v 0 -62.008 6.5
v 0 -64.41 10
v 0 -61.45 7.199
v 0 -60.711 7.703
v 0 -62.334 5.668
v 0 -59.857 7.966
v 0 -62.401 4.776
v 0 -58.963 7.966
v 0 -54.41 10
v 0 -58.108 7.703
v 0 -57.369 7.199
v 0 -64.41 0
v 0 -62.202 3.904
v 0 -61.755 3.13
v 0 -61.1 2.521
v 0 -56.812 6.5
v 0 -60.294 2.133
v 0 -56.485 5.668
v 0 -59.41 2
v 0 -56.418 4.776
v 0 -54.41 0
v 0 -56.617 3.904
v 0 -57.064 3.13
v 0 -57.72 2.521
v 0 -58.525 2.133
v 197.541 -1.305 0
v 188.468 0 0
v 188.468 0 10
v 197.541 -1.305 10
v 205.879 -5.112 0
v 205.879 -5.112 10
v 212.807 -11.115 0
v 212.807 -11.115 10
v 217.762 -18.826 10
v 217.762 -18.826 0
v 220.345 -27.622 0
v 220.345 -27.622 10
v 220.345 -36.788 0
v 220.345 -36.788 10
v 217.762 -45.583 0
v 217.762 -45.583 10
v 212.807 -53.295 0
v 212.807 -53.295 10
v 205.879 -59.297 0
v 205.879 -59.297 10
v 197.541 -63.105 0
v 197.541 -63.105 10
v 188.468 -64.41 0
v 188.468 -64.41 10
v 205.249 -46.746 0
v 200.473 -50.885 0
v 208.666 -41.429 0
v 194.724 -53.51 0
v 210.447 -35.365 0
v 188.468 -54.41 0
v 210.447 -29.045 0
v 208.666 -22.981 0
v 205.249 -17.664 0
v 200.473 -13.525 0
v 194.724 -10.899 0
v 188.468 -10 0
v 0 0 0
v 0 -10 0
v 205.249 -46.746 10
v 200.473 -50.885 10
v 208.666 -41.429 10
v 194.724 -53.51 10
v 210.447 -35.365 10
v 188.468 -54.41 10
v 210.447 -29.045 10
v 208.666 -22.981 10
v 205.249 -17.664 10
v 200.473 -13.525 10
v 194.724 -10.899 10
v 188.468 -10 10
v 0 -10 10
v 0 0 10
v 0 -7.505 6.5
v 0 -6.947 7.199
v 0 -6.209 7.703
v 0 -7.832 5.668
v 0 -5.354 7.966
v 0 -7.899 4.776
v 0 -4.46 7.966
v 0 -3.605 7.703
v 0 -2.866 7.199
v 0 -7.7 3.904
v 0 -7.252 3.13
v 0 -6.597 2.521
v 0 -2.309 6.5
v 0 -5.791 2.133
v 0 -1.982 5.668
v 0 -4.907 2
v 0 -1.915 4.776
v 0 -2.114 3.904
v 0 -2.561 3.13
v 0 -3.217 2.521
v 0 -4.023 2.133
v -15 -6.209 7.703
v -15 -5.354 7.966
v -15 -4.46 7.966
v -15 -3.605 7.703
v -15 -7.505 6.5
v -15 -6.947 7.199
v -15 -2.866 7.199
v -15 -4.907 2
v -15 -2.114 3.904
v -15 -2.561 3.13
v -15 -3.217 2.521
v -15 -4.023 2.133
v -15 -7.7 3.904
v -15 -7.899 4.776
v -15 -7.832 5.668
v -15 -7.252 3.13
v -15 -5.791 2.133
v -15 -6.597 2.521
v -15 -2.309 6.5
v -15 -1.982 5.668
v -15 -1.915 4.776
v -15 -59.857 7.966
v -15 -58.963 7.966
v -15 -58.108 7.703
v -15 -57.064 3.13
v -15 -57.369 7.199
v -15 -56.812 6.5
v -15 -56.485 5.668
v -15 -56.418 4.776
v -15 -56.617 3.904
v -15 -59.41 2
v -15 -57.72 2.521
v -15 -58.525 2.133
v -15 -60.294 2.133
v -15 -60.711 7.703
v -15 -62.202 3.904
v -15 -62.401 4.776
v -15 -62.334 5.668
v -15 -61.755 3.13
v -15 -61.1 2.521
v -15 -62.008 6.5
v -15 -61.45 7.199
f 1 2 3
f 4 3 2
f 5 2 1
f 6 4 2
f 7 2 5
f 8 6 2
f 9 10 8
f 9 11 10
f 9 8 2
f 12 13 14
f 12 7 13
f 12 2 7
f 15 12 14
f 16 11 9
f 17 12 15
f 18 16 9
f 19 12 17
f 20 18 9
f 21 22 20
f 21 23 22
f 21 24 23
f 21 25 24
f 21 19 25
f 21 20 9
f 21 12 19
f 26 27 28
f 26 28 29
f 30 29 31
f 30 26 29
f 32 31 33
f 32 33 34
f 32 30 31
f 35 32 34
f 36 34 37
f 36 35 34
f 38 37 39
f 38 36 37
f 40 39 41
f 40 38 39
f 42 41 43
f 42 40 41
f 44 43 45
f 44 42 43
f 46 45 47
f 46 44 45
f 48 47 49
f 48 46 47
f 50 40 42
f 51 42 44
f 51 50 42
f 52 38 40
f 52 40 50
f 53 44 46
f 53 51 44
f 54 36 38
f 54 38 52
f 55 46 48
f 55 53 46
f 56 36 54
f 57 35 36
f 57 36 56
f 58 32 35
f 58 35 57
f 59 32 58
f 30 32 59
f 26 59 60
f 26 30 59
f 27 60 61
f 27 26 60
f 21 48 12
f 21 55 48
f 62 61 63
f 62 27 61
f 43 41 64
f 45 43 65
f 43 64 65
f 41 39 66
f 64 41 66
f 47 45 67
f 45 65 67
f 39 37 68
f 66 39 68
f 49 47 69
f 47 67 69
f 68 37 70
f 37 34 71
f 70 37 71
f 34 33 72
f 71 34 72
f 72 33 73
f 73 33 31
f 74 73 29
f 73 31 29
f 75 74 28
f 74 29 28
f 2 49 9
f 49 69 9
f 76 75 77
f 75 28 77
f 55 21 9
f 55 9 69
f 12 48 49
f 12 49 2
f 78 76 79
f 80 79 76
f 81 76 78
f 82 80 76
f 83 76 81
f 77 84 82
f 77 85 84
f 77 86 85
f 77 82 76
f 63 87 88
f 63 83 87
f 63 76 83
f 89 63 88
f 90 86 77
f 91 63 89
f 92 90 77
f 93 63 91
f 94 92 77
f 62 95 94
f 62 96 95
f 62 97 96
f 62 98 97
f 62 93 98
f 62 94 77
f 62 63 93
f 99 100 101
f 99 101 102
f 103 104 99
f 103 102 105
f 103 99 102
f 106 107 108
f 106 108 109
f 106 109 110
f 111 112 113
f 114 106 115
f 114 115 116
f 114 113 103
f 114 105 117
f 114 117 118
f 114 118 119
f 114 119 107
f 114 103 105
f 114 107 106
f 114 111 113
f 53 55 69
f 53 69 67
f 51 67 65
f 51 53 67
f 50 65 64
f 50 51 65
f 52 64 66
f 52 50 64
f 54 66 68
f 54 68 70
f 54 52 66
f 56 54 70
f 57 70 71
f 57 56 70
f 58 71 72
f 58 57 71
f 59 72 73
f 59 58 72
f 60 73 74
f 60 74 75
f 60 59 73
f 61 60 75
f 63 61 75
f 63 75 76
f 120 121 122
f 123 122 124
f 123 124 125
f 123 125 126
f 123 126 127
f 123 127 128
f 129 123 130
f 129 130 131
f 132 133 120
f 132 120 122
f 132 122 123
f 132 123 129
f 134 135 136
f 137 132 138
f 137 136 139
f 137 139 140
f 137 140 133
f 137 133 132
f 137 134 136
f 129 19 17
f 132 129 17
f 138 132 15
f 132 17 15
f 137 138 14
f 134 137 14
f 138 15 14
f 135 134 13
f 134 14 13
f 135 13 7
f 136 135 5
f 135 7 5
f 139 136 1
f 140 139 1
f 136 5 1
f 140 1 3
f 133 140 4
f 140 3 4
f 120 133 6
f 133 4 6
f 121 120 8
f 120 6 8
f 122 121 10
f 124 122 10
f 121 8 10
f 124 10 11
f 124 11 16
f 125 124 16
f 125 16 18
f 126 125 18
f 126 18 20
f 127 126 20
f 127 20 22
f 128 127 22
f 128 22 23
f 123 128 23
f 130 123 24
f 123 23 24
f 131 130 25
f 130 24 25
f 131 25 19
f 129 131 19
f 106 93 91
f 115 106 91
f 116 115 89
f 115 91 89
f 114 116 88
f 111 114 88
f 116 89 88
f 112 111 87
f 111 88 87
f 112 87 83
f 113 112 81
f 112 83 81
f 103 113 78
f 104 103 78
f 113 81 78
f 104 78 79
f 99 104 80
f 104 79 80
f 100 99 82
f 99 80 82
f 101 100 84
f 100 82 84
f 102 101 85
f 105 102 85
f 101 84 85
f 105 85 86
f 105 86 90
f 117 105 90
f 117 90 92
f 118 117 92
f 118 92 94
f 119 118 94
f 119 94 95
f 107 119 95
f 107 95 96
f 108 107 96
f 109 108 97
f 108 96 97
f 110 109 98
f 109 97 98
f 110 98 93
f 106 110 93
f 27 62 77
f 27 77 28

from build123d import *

# Parameters (mm, degrees)
BOSS_EXTRUDE1_DEPTH = 10
SKETCH2_R           = 3
BOSS_EXTRUDE2_DEPTH = 15
SKETCH3_R           = 3
BOSS_EXTRUDE3_DEPTH = 15


with BuildPart() as part:
    # Sketch1 → Boss-Extrude1 (new body)
    with BuildSketch(Plane.XY):
        with BuildLine():
            Line((0, 0), (188.467924539, 0))
            ThreePointArc((188.467924539, 0), (220.672766762, -32.204842223), (188.467924539, -64.409684446))
            Line((188.467924539, -64.409684446), (0, -64.409684446))
            Line((0, -64.409684446), (0, -54.409684446))
            Line((0, -54.409684446), (188.467924539, -54.409684446))
            ThreePointArc((188.467924539, -54.409684446), (210.672766762, -32.204842223), (188.467924539, -10))
            Line((188.467924539, -10), (0, -10))
            Line((0, -10), (0, 0))
        make_face()
    extrude(amount=BOSS_EXTRUDE1_DEPTH)

    # Sketch2 → Boss-Extrude2 (add)
    with BuildSketch(Plane.ZY):
        with Locations(Location((5, -4.906979909, 0), (0, 0, 180))):
            Circle(SKETCH2_R)
    extrude(amount=BOSS_EXTRUDE2_DEPTH)

    # Sketch3 → Boss-Extrude3 (add)
    with BuildSketch(Plane.ZY):
        with Locations(Location((5, -59.409684446, 0), (0, 0, 180))):
            Circle(SKETCH3_R)
    extrude(amount=BOSS_EXTRUDE3_DEPTH)


solid = part.part
